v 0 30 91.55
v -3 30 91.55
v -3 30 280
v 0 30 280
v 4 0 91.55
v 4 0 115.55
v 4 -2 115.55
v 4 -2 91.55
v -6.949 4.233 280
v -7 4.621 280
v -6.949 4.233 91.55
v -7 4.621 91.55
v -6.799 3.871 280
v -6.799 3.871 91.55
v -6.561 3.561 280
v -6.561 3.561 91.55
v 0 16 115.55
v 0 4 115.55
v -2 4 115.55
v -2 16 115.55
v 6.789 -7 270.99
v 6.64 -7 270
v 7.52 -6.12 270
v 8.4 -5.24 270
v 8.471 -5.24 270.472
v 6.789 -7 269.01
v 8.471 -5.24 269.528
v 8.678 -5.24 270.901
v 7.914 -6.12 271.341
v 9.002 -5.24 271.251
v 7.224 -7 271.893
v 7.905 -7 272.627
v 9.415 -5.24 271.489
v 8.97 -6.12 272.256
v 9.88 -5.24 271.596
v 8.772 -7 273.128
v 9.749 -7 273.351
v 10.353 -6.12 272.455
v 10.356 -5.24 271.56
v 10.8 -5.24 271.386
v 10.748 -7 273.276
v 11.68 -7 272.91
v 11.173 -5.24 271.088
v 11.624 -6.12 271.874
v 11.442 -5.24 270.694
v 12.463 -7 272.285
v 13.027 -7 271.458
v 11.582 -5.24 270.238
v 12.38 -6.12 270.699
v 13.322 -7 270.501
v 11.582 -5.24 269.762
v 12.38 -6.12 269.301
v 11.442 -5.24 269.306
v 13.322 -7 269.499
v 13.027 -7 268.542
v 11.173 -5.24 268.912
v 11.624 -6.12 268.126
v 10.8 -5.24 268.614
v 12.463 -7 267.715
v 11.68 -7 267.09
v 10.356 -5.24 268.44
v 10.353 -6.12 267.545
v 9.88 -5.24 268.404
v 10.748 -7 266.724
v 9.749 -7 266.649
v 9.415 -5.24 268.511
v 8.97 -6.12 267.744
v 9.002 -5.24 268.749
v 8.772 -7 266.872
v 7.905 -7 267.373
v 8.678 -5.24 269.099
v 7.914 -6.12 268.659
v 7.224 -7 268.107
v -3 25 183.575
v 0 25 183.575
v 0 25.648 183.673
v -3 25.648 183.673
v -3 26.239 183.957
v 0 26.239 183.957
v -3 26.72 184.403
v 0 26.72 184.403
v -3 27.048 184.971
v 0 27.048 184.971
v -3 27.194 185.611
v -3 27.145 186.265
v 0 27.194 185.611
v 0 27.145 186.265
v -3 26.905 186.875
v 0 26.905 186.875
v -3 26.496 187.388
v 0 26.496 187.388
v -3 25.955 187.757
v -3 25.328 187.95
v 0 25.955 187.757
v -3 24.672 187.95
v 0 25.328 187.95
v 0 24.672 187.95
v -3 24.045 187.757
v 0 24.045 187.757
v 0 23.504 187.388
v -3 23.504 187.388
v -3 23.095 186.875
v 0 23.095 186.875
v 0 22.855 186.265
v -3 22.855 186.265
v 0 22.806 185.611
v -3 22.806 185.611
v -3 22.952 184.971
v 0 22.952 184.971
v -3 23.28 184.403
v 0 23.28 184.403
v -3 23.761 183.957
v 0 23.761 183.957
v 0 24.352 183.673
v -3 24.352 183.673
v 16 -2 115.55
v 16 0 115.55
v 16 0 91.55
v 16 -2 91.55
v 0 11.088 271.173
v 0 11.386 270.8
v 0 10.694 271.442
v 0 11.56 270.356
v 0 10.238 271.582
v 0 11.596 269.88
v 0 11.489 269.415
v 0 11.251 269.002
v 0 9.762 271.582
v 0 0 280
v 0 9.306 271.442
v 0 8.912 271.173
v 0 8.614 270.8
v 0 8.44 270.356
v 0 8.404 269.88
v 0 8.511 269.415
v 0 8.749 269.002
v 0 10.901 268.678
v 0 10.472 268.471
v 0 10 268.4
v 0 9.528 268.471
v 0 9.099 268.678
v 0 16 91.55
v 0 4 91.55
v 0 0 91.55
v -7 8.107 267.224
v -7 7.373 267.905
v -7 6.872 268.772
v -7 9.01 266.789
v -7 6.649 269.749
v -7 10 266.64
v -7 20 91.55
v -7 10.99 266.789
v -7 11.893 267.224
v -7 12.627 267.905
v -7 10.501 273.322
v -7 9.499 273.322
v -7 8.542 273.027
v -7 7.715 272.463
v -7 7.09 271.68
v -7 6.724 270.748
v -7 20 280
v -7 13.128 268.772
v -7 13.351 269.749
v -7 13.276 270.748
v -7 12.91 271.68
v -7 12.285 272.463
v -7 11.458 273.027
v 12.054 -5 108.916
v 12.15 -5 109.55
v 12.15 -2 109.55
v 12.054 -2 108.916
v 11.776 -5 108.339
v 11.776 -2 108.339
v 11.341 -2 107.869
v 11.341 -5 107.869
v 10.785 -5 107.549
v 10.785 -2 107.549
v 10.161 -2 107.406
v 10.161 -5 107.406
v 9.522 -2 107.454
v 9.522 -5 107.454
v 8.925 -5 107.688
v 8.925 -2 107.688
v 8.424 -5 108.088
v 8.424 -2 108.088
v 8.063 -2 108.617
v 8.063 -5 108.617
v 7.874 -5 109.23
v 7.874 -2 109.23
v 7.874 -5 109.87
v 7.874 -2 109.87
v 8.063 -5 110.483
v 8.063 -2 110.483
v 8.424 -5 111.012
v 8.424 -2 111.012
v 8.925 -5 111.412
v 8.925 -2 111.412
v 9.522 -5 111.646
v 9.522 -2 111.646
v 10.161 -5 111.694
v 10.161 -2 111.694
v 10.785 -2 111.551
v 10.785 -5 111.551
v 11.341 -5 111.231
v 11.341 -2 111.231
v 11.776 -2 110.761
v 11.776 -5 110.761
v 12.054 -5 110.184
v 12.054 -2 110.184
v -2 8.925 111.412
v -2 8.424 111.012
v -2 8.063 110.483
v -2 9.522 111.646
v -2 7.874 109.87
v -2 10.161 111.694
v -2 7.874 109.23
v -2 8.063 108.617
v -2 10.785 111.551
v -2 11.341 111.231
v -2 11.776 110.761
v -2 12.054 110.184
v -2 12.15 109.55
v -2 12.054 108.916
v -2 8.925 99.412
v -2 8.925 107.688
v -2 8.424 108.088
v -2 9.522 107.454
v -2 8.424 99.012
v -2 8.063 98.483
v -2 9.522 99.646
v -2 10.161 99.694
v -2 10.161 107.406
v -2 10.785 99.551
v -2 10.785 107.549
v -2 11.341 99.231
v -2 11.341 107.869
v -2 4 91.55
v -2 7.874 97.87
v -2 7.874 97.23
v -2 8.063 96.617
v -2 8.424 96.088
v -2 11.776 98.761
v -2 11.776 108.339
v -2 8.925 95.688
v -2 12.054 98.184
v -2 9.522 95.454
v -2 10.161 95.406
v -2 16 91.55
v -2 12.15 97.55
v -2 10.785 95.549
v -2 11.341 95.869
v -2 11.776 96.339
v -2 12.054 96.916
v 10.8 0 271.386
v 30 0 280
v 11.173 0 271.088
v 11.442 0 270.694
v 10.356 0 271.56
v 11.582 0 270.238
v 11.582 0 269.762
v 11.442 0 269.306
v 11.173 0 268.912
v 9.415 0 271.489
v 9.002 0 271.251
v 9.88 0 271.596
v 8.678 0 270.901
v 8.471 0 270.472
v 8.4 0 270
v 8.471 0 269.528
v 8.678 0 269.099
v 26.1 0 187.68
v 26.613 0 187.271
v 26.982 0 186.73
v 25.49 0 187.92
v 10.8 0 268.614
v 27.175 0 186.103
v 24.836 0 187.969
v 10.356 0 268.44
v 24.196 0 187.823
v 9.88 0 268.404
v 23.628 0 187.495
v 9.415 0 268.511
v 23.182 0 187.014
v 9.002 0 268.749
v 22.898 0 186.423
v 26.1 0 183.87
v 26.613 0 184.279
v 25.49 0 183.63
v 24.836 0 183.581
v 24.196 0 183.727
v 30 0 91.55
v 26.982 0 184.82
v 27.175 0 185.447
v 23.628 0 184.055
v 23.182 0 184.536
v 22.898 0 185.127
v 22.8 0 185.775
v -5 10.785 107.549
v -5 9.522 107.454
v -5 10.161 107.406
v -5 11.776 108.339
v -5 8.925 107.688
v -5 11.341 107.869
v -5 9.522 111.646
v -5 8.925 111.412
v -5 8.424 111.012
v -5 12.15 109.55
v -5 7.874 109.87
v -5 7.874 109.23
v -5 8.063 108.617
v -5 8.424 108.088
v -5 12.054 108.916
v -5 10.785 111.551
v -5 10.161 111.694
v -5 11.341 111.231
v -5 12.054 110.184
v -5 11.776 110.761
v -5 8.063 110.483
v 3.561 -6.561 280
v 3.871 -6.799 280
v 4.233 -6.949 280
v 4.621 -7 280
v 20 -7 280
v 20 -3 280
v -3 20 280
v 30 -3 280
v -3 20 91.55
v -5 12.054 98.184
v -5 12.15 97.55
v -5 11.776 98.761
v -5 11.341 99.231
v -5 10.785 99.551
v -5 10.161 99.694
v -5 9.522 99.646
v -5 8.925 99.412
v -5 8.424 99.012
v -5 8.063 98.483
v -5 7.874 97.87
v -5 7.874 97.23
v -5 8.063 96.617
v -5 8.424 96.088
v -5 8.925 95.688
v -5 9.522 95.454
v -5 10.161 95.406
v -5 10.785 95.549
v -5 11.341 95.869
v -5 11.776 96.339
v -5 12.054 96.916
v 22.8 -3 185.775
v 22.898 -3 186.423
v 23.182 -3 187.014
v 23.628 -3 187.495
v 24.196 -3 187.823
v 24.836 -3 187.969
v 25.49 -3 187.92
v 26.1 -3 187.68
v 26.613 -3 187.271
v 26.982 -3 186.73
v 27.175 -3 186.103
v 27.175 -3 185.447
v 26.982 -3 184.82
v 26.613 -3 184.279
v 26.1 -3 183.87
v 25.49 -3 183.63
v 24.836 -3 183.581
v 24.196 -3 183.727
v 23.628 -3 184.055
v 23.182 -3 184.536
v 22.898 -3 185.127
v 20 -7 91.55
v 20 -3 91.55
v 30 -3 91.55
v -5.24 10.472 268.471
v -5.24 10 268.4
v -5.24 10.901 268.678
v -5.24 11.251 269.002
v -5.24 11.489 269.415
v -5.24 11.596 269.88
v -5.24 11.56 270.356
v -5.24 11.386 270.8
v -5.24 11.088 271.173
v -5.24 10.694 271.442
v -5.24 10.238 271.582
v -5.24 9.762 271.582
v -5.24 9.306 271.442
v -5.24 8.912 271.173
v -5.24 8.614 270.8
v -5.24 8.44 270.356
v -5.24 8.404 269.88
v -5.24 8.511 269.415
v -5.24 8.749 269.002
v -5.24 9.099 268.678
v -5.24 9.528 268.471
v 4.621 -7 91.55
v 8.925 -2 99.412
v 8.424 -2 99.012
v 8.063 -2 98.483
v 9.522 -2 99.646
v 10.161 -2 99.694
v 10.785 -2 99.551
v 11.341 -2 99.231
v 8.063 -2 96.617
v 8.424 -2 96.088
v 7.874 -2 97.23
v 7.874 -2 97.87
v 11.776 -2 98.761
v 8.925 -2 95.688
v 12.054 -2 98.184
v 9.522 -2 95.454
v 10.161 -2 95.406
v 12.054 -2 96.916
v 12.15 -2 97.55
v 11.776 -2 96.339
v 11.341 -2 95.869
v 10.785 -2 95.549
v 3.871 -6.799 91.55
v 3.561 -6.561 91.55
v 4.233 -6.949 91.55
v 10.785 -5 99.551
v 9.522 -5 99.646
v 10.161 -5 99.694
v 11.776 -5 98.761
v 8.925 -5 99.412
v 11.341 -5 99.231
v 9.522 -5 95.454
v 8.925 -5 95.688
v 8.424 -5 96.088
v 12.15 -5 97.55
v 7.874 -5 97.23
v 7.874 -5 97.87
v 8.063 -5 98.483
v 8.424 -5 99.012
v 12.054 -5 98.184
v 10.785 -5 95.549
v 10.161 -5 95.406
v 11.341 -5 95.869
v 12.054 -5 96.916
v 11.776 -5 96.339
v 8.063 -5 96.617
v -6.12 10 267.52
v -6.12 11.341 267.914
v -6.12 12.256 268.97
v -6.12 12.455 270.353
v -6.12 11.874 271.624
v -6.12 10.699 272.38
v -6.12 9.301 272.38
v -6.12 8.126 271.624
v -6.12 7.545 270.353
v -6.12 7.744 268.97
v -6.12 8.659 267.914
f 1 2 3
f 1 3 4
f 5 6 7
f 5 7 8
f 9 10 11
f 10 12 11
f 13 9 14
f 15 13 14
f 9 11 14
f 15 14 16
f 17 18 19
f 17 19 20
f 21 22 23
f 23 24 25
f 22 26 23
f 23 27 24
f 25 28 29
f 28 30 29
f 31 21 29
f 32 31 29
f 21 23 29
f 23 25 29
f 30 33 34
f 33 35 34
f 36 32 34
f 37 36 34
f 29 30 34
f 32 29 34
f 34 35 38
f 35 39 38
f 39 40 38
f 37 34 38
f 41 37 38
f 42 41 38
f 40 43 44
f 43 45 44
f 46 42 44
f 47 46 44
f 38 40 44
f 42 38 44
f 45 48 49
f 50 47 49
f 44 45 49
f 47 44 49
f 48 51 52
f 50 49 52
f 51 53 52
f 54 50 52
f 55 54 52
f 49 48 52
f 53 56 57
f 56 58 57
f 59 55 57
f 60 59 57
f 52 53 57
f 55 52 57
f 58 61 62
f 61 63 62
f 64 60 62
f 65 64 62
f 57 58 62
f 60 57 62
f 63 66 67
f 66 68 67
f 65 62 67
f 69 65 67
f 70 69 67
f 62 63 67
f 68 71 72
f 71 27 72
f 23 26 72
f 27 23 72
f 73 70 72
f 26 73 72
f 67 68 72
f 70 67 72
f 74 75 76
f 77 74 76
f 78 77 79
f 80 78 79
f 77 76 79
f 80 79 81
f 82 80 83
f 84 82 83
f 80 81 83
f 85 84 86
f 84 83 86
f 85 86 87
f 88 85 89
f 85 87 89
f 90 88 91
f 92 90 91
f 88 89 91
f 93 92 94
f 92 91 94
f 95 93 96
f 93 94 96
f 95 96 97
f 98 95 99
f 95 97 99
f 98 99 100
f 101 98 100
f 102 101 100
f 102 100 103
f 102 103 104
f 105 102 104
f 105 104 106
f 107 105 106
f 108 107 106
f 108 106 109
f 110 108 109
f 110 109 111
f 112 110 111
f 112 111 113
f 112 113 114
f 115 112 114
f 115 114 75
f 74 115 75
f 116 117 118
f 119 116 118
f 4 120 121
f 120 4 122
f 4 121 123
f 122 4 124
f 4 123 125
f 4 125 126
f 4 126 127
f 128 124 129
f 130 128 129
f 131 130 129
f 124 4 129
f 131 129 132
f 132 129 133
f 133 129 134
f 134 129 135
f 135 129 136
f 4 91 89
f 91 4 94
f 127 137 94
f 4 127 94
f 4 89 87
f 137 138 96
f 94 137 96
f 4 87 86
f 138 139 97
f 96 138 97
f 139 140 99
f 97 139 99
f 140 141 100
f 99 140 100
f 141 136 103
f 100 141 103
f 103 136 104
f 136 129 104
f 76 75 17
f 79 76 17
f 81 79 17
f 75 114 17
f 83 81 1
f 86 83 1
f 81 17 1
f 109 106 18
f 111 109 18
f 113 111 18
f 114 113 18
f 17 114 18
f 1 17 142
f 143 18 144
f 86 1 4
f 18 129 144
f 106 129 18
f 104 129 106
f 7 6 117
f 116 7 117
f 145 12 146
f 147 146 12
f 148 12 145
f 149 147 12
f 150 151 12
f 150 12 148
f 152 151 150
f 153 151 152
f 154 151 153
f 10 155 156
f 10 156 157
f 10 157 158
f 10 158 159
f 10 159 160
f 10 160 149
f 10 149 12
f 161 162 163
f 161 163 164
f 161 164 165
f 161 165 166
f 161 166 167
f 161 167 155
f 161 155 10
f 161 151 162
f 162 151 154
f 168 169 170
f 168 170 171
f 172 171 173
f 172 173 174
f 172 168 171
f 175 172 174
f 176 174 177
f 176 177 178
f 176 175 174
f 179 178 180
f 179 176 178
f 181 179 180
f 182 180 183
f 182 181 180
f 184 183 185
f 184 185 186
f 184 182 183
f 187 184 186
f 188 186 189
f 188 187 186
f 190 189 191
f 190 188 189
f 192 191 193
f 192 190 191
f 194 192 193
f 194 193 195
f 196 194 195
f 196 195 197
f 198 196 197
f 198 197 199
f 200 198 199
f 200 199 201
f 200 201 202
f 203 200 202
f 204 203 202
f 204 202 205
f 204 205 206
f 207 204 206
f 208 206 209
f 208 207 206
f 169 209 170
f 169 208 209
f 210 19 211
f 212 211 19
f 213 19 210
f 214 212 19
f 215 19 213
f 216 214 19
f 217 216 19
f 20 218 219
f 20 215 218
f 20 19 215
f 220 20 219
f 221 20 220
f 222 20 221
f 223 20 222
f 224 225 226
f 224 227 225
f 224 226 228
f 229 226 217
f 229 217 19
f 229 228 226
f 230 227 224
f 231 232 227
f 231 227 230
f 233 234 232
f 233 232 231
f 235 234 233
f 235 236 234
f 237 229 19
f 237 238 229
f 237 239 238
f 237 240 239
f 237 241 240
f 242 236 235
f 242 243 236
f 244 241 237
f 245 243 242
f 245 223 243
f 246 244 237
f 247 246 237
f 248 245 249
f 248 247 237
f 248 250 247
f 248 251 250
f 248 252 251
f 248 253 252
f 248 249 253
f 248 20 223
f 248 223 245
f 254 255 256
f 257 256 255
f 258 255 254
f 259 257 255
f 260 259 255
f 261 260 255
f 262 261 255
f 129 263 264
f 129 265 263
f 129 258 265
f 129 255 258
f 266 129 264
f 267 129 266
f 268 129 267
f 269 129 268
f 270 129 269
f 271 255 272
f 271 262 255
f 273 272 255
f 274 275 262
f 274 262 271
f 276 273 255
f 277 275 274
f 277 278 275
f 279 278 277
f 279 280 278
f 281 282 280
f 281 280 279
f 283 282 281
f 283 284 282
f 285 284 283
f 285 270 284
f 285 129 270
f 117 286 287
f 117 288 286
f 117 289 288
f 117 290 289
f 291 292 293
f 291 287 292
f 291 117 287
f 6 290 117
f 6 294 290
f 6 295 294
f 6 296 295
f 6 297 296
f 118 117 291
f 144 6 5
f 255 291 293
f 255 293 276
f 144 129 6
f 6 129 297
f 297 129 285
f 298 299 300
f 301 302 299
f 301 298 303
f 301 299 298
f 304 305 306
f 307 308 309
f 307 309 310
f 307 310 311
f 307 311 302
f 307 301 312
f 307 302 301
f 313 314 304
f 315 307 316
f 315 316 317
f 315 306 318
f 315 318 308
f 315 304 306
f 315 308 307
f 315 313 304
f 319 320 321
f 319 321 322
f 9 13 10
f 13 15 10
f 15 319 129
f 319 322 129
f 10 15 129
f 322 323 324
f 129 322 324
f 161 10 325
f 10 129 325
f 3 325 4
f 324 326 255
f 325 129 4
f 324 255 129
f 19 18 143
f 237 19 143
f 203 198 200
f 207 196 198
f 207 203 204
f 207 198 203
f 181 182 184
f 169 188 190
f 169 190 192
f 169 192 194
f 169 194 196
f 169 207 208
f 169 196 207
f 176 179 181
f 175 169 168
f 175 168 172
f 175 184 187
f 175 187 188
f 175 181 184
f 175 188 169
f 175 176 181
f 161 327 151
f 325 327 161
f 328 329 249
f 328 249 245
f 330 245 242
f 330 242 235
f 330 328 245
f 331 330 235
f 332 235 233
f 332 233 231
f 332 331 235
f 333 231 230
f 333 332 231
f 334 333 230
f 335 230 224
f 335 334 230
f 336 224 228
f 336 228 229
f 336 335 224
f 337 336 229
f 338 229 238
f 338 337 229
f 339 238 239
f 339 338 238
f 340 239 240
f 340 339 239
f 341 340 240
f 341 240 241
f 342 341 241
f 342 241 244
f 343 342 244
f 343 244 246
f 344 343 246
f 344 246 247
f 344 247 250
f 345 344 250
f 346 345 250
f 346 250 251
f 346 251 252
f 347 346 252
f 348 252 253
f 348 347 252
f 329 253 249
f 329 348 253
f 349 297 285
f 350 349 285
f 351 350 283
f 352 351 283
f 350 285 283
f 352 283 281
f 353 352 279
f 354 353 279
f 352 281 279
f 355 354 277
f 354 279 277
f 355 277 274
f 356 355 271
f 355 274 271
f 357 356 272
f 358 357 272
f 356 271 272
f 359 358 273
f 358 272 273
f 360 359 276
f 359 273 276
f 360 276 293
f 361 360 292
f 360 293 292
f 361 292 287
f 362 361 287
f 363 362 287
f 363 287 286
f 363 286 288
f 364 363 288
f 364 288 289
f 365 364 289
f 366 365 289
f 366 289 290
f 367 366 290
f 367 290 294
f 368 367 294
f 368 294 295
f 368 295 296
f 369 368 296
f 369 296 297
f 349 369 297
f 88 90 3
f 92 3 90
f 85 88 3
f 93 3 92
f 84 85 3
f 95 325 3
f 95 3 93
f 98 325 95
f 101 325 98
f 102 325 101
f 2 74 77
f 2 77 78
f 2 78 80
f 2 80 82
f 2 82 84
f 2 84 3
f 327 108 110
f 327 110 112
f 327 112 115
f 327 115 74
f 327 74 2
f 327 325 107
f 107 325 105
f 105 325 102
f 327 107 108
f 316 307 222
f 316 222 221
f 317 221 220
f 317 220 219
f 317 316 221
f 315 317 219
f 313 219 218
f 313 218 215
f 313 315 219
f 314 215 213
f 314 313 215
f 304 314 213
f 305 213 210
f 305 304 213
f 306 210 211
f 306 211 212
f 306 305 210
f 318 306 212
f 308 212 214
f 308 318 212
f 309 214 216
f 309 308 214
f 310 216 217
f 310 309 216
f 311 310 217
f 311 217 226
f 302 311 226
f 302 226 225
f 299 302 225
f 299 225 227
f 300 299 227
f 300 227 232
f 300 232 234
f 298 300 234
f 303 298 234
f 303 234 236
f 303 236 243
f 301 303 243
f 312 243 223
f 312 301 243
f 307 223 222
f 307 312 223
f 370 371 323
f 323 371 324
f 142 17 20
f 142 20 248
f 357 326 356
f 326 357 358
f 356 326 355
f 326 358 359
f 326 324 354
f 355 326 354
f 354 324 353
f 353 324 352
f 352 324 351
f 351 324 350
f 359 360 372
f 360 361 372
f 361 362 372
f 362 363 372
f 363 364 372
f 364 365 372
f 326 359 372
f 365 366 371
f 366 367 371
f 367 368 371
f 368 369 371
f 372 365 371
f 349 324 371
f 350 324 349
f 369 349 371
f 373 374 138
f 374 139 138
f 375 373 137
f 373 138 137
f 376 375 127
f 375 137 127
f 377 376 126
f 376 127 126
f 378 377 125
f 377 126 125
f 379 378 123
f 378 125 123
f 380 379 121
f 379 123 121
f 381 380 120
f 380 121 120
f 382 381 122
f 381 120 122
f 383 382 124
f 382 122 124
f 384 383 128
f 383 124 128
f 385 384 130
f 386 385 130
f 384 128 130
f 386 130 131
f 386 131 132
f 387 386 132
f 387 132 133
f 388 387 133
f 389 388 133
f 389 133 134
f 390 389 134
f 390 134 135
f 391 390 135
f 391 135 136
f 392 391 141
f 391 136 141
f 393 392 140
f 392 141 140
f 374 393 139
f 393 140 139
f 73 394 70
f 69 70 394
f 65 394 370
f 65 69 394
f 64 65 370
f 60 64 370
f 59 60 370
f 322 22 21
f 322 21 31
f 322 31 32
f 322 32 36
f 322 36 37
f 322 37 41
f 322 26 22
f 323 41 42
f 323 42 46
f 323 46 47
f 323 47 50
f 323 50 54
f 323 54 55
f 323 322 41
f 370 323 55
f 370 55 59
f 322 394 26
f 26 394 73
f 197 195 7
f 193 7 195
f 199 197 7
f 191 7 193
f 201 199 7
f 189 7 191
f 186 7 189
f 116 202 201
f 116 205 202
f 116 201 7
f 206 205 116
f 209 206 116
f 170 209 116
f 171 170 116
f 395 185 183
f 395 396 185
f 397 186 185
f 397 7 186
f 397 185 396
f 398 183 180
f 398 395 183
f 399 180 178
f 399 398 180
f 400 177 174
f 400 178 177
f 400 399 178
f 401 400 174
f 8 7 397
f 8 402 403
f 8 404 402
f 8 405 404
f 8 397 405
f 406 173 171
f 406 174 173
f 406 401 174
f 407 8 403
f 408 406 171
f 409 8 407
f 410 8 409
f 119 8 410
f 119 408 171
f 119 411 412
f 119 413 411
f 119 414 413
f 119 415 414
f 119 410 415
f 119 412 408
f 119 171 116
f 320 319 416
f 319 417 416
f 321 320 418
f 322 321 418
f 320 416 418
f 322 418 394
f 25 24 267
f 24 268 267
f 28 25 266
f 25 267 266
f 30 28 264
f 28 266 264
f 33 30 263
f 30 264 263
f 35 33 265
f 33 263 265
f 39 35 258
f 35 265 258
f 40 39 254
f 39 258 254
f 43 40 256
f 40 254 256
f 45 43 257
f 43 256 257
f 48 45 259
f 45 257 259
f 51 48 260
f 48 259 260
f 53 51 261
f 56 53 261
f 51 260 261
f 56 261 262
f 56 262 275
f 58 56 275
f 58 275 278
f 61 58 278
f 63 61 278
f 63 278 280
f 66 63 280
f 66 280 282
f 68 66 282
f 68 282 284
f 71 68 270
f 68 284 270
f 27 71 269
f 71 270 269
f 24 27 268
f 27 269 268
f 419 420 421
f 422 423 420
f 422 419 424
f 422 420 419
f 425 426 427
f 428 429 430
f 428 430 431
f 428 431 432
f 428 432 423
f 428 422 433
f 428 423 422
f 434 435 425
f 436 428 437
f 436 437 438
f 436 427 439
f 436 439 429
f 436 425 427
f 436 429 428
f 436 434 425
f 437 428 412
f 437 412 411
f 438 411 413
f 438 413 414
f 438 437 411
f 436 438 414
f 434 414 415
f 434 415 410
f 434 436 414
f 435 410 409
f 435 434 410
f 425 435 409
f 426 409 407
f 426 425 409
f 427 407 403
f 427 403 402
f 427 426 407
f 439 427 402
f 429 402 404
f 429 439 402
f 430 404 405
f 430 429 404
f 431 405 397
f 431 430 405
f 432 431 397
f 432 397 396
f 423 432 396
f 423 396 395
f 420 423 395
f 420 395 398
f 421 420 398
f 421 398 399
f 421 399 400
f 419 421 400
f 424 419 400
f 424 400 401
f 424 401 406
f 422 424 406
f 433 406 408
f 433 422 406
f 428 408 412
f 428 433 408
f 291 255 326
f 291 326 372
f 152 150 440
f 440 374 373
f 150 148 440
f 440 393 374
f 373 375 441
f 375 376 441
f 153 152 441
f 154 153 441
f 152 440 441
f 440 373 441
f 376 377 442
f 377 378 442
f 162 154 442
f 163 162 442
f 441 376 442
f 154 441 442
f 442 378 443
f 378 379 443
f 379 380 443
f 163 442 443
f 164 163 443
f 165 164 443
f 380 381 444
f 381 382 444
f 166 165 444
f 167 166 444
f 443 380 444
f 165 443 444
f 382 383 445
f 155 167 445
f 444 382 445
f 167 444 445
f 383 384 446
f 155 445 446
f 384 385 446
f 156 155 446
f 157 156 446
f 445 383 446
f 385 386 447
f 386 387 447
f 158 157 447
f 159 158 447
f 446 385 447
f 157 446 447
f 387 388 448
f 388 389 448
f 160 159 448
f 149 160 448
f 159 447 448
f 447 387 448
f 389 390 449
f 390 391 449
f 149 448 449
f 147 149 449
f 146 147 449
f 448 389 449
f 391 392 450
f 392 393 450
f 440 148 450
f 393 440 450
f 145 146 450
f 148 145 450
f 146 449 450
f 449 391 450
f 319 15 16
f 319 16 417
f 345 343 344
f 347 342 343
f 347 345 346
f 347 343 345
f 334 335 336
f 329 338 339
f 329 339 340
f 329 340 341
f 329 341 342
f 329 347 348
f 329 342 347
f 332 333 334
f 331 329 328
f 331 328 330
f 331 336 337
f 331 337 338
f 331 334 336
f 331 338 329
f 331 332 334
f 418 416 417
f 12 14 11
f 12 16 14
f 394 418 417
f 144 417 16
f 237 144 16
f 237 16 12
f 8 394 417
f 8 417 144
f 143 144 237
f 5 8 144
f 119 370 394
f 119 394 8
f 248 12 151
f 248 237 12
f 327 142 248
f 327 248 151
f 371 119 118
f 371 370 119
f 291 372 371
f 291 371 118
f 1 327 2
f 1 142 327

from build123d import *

# Parameters (mm, degrees)
BOSS_EXTRUDE1_DEPTH                = 188.45
SKETCH6_W                          = 188.45
SKETCH6_H                          = 3
BOSS_EXTRUDE2_DEPTH                = 10
SKETCH7_W                          = 13
SKETCH7_H                          = 188.45
BOSS_EXTRUDE3_DEPTH                = 4
SKETCH8_W                          = 3
SKETCH8_H                          = 188.45
BOSS_EXTRUDE4_DEPTH                = 10
SKETCH9_W                          = 188.45
SKETCH9_H                          = 13
BOSS_EXTRUDE5_DEPTH                = 4
CSK_FOR_M3_SFHCS1_D                = 3.2
CSK_FOR_M3_SFHCS1_CSINK_D          = 6.72
CSK_FOR_M3_SFHCS1_CSINK_ANGLE      = 90
CSK_FOR_M3_SFHCS2_D                = 3.2
CSK_FOR_M3_SFHCS2_CSINK_D          = 6.72
CSK_FOR_M3_SFHCS2_CSINK_ANGLE      = 90
FILLET1_R                          = 1.5
F_4_4_4_4_DIAMETER_HOLE1_D         = 4.4
F_4_4_4_4_DIAMETER_HOLE1_DEPTH     = 10
F_4_4_4_4_DIAMETER_HOLE1_TIP       = 1.321893362
F_4_4_4_4_DIAMETER_HOLE3_D         = 4.4
F_4_4_4_4_DIAMETER_HOLE3_DEPTH     = 10
F_4_4_4_4_DIAMETER_HOLE3_TIP       = 1.321893362
SKETCH18_W                         = 12
SKETCH18_H                         = 24
CUT_EXTRUDE1_DEPTH                 = 2
F_4_3_START                        = -5
F_4_3_4_3_DIAMETER_HOLE1_OUTLINE_R = 2.15
F_4_3_4_3_DIAMETER_HOLE1_DEPTH     = 3
SKETCH21_W                         = 24
SKETCH21_H                         = 12
CUT_EXTRUDE2_DEPTH                 = 2
F_4_3_4_3_DIAMETER_HOLE2_OUTLINE_R = 2.15
F_4_3_4_3_DIAMETER_HOLE2_DEPTH     = 3


# Read off the part's stored shape, not the designer's step: Ø4.3 (4.3) Diameter Hole1, Ø4.3 (4.3) Diameter Hole2
with BuildPart() as part:
    # Sketch1 → Boss-Extrude1 (new body)
    with BuildSketch(Plane.XY.offset(280)):
        Polygon((-7, 4), (4, -7), (7, -7), (7, -3), (20, -3), (20, 0), (0, 0), (0, 20), (-3, 20), (-3, 7), (-7, 7), align=None)
    extrude(amount=-BOSS_EXTRUDE1_DEPTH)

    # Sketch6 → Boss-Extrude2 (add)
    with BuildSketch(Plane(origin=(20, 0, 0), x_dir=(0, 0, -1), z_dir=(1, 0, 0))):
        with Locations((-185.775, -1.5)):
            Rectangle(SKETCH6_W, SKETCH6_H)
    extrude(amount=BOSS_EXTRUDE2_DEPTH)

    # Sketch7 → Boss-Extrude3 (add)
    with BuildSketch(Plane.XZ.offset(3)):
        with Locations((13.5, 185.775)):
            Rectangle(SKETCH7_W, SKETCH7_H)
    extrude(amount=BOSS_EXTRUDE3_DEPTH)

    # Sketch8 → Boss-Extrude4 (add)
    with BuildSketch(Plane(origin=(0, 20, 0), x_dir=(1, 0, 0), z_dir=(0, 1, 0))):
        with Locations((-1.5, -185.775)):
            Rectangle(SKETCH8_W, SKETCH8_H)
    extrude(amount=BOSS_EXTRUDE4_DEPTH)

    # Sketch9 → Boss-Extrude5 (add)
    with BuildSketch(Plane.ZY.offset(3)):
        with Locations((185.775, 13.5)):
            Rectangle(SKETCH9_W, SKETCH9_H)
    extrude(amount=BOSS_EXTRUDE5_DEPTH)

    # CSK for M3 SFHCS1 (through all)
    with Locations(Plane.XZ.offset(7)):
        with Locations((10, 270)):
            CounterSinkHole(CSK_FOR_M3_SFHCS1_D / 2, CSK_FOR_M3_SFHCS1_CSINK_D / 2, counter_sink_angle=CSK_FOR_M3_SFHCS1_CSINK_ANGLE)

    # CSK for M3 SFHCS2 (through all)
    with Locations(Plane.ZY.offset(7)):
        with Locations((270, 10)):
            CounterSinkHole(CSK_FOR_M3_SFHCS2_D / 2, CSK_FOR_M3_SFHCS2_CSINK_D / 2, counter_sink_angle=CSK_FOR_M3_SFHCS2_CSINK_ANGLE)

    # Fillet1
    fillet1_edges = [part.edges().sort_by_distance(p)[0] for p in [
        (4, -7, 185.775),
        (-7, 4, 185.775),
    ]]
    fillet(fillet1_edges, radius=FILLET1_R)

    # Ø4.4 (4.4) Diameter Hole1
    with Locations(Plane.ZY.offset(3)):
        with Locations((185.775, 25)):
            Hole(F_4_4_4_4_DIAMETER_HOLE1_D / 2, depth=F_4_4_4_4_DIAMETER_HOLE1_DEPTH)
            with Locations((0, 0, -(F_4_4_4_4_DIAMETER_HOLE1_DEPTH + F_4_4_4_4_DIAMETER_HOLE1_TIP / 2))):  # 118° drill point
                Cone(0, F_4_4_4_4_DIAMETER_HOLE1_D / 2, F_4_4_4_4_DIAMETER_HOLE1_TIP, mode=Mode.SUBTRACT)

    # Ø4.4 (4.4) Diameter Hole3
    with Locations(Plane.XZ.offset(3)):
        with Locations((25, 185.775)):
            Hole(F_4_4_4_4_DIAMETER_HOLE3_D / 2, depth=F_4_4_4_4_DIAMETER_HOLE3_DEPTH)
            with Locations((0, 0, -(F_4_4_4_4_DIAMETER_HOLE3_DEPTH + F_4_4_4_4_DIAMETER_HOLE3_TIP / 2))):  # 118° drill point
                Cone(0, F_4_4_4_4_DIAMETER_HOLE3_D / 2, F_4_4_4_4_DIAMETER_HOLE3_TIP, mode=Mode.SUBTRACT)

    # Sketch18 → Cut-Extrude1 (cut)
    with BuildSketch(Plane(origin=(0, 0, 0), x_dir=(1, 0, 0), z_dir=(0, 1, 0))):
        with Locations((10, -103.55)):
            Rectangle(SKETCH18_W, SKETCH18_H)
    extrude(amount=-CUT_EXTRUDE1_DEPTH, mode=Mode.SUBTRACT)

    # Ø4.3 (4.3) Diameter Hole1 outline → Ø4.3 (4.3) Diameter Hole1 (cut)
    with BuildSketch(Plane(origin=(0, 0, 0), x_dir=(1, 0, 0), z_dir=(0, 1, 0)).offset(F_4_3_START)):
        with Locations((10, -109.55)):
            Circle(F_4_3_4_3_DIAMETER_HOLE1_OUTLINE_R)
        with Locations((10, -97.55)):
            Circle(F_4_3_4_3_DIAMETER_HOLE1_OUTLINE_R)
    extrude(amount=F_4_3_4_3_DIAMETER_HOLE1_DEPTH, mode=Mode.SUBTRACT)

    # Sketch21 → Cut-Extrude2 (cut)
    with BuildSketch(Plane(origin=(0, 0, 0), x_dir=(0, 0, -1), z_dir=(1, 0, 0))):
        with Locations((-103.55, 10)):
            Rectangle(SKETCH21_W, SKETCH21_H)
    extrude(amount=-CUT_EXTRUDE2_DEPTH, mode=Mode.SUBTRACT)

    # Ø4.3 (4.3) Diameter Hole2 outline → Ø4.3 (4.3) Diameter Hole2 (cut)
    with BuildSketch(Plane.YZ.offset(F_4_3_START)):
        with Locations((10, 109.55)):
            Circle(F_4_3_4_3_DIAMETER_HOLE2_OUTLINE_R)
        with Locations((10, 97.55)):
            Circle(F_4_3_4_3_DIAMETER_HOLE2_OUTLINE_R)
    extrude(amount=F_4_3_4_3_DIAMETER_HOLE2_DEPTH, mode=Mode.SUBTRACT)


solid = part.part
